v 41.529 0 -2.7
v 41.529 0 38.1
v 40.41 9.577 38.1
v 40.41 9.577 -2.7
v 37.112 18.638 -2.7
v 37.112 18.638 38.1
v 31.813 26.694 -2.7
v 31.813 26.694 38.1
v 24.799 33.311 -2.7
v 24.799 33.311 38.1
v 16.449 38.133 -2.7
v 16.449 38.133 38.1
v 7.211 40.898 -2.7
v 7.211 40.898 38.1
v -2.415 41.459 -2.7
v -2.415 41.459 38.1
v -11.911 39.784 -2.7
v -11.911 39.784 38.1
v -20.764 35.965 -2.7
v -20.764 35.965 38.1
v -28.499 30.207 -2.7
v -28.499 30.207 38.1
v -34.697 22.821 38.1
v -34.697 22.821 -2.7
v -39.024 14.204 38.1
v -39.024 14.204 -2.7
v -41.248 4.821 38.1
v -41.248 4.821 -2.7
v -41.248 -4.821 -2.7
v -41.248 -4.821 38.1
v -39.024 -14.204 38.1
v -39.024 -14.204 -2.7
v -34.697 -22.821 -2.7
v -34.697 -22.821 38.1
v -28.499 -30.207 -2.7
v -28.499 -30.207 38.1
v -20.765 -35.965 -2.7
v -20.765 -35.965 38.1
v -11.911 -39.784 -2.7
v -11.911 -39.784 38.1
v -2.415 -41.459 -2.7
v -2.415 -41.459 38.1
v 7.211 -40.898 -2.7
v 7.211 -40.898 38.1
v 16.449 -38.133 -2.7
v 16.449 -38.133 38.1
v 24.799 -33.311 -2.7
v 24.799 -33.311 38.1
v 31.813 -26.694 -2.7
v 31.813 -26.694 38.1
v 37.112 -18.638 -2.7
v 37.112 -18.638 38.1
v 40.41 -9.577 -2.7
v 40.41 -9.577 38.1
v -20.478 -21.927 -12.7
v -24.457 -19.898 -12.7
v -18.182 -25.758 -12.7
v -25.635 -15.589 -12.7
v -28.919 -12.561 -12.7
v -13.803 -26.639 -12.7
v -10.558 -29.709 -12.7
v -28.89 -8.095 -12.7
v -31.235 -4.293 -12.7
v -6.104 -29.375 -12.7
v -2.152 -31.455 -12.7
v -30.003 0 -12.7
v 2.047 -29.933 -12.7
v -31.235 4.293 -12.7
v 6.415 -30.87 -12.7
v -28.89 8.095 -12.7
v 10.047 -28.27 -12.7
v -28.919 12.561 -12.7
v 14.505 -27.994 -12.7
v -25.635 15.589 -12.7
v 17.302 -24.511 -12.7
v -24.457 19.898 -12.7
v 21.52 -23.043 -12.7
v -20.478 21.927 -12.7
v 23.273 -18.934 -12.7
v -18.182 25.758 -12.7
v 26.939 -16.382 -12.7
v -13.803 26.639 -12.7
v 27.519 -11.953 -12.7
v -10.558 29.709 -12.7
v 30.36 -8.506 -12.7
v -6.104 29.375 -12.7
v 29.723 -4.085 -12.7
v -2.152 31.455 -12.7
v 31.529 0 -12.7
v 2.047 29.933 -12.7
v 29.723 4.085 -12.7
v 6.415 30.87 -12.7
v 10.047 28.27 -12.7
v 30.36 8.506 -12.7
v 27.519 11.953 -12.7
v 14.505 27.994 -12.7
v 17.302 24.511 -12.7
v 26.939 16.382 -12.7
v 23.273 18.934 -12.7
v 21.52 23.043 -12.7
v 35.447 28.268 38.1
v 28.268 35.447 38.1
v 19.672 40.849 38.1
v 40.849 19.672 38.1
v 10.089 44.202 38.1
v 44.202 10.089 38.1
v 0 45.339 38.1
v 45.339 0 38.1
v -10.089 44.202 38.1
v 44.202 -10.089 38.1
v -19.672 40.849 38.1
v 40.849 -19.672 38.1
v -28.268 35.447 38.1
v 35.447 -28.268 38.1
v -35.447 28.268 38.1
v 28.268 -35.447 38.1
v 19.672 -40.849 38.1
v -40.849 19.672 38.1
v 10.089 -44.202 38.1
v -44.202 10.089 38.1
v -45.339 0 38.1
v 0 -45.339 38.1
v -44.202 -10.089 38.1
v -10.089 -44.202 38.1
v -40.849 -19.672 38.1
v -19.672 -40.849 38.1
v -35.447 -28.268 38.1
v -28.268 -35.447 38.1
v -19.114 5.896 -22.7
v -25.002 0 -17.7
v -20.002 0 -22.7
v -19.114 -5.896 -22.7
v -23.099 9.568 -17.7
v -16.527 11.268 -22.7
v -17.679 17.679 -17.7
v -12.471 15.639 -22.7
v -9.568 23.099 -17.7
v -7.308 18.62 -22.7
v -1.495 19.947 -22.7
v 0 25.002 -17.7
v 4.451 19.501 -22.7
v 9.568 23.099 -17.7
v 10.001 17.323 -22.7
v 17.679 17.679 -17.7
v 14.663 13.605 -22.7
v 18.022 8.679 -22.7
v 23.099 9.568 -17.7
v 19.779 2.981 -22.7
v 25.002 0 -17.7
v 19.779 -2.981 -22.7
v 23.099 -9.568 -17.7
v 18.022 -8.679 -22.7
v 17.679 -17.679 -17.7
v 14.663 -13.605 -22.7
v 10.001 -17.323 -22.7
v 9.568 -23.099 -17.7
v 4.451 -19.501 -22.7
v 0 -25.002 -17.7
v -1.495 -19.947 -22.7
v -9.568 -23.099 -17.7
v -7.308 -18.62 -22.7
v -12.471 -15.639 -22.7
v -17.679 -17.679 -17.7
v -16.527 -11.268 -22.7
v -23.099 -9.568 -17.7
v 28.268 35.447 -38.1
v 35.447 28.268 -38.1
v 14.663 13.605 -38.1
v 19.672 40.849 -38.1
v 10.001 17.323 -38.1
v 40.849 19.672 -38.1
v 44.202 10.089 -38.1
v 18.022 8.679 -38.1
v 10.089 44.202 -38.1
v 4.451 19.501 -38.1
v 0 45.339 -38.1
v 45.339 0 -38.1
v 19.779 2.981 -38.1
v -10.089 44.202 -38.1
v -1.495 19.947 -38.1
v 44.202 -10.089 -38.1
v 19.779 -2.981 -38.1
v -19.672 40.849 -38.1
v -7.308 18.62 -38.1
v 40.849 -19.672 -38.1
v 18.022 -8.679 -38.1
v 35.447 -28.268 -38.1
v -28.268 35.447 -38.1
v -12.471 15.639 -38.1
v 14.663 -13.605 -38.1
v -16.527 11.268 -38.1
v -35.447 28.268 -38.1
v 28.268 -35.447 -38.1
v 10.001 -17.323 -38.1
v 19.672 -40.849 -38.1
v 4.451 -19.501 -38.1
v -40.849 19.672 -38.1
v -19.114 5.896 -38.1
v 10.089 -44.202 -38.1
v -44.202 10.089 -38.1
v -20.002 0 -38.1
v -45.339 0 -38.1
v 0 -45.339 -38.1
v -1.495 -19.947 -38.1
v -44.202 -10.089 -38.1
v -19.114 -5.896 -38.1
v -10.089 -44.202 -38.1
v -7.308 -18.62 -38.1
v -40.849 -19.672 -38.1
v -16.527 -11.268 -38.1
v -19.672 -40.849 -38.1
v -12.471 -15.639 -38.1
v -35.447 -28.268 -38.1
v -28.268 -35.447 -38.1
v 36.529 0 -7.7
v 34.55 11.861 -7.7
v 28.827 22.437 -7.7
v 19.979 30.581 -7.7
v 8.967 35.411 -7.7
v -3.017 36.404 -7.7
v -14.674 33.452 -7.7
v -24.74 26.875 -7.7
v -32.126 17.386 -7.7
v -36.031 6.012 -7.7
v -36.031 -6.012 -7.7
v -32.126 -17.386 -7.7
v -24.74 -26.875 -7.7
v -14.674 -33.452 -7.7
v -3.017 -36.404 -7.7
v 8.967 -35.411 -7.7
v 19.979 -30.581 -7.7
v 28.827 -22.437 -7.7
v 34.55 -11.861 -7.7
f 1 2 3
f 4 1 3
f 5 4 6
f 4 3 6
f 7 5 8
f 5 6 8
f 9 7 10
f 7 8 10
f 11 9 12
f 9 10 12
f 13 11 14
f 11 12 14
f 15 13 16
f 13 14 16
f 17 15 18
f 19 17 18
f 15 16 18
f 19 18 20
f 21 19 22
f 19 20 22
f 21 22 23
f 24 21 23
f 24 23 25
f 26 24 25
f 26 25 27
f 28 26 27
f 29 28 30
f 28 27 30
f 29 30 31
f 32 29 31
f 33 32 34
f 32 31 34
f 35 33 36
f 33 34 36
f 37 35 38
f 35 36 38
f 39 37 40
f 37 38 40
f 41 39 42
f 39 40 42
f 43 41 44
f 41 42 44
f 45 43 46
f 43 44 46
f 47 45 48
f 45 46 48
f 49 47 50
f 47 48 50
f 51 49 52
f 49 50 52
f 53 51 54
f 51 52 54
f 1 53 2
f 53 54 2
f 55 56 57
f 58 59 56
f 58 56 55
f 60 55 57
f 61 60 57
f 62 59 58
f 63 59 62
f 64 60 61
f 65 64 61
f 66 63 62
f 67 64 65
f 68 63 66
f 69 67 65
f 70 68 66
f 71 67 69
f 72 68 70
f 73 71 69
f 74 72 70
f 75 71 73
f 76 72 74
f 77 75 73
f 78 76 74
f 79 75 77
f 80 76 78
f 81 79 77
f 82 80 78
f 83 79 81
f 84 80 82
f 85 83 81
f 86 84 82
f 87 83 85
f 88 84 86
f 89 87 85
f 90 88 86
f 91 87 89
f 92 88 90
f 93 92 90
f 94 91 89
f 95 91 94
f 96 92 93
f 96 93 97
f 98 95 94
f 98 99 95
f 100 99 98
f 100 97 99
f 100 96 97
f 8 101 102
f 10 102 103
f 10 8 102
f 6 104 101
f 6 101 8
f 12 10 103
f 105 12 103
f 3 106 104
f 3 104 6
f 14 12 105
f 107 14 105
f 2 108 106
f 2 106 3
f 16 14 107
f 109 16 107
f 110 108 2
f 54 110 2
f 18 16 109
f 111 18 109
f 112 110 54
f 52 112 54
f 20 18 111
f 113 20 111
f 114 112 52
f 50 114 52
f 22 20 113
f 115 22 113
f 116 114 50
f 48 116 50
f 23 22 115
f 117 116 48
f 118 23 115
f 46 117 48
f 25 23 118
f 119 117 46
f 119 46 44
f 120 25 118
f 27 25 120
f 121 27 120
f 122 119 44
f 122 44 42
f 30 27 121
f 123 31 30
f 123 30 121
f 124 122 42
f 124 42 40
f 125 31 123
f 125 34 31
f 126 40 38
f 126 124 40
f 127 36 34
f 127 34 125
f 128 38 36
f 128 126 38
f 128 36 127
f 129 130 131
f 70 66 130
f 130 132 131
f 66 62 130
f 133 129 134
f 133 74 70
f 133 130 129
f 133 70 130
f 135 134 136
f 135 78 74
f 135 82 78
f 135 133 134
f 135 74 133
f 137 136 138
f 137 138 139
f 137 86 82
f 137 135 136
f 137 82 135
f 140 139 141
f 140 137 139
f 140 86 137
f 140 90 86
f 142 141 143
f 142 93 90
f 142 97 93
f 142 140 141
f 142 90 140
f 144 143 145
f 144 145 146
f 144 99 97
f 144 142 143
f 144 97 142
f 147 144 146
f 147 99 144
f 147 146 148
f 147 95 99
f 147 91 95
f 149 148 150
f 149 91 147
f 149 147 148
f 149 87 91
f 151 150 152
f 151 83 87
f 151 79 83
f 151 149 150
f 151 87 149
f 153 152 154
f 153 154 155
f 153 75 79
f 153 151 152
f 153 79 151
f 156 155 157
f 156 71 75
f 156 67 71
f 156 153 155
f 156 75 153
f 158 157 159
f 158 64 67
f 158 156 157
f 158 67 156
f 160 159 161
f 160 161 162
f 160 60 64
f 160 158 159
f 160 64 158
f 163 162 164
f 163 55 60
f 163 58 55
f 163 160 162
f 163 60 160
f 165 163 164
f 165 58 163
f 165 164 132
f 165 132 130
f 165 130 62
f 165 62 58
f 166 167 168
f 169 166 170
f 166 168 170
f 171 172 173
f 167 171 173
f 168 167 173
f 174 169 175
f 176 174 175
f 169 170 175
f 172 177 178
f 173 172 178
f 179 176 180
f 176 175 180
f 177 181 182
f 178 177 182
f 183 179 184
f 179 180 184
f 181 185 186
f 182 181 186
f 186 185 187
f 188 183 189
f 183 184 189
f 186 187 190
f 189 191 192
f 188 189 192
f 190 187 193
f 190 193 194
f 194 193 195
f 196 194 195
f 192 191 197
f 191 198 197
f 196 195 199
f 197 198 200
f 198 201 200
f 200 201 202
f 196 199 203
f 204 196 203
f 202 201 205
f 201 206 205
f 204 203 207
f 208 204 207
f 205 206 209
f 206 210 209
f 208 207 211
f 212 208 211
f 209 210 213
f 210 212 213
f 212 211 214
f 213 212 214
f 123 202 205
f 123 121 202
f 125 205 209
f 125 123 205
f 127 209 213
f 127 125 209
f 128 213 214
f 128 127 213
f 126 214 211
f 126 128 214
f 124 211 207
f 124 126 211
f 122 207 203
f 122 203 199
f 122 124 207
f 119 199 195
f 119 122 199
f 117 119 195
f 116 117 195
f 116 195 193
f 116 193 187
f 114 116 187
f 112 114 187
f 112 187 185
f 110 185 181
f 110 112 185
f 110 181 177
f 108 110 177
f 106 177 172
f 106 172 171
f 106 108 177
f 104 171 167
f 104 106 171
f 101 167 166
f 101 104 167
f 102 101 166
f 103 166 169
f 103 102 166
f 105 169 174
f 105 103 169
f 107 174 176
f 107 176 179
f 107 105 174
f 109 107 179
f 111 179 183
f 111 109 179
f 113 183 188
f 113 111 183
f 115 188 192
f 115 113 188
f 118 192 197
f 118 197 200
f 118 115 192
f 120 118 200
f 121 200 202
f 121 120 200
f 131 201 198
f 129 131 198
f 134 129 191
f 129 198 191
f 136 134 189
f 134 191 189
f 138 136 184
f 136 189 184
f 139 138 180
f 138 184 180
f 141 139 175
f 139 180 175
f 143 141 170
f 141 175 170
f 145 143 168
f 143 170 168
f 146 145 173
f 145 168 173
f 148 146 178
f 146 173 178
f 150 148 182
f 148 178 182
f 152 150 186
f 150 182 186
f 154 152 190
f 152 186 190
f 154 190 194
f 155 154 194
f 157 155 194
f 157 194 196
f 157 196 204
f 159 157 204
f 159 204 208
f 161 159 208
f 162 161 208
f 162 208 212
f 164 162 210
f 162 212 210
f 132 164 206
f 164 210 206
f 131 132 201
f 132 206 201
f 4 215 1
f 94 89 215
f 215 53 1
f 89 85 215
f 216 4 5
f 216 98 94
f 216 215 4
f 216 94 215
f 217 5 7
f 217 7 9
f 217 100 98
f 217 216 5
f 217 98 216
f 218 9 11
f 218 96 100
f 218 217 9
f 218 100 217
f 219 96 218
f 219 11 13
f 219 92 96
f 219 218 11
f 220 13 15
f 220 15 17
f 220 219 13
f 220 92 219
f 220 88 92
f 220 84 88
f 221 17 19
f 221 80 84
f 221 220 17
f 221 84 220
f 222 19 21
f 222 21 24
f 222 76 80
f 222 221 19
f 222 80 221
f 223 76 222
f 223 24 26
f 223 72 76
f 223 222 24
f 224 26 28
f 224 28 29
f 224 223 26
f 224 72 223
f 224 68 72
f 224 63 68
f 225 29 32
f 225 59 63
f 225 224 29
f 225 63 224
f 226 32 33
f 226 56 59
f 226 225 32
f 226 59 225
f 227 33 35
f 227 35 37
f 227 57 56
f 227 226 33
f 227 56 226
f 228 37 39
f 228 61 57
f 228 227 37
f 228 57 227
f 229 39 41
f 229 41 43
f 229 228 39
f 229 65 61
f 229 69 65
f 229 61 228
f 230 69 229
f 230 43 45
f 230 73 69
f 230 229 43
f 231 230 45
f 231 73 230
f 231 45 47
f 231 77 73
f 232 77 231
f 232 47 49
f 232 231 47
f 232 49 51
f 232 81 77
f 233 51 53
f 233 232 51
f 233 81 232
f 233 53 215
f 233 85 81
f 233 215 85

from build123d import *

# Parameters (mm, degrees)
SKETCH1_R           = 45.339
BOSS_EXTRUDE2_DEPTH = 38.1
SKETCH3_R           = 41.529
CUT_EXTRUDE1_DEPTH  = 50.8
SKETCH4_R           = 20.0025
CUT_EXTRUDE2_DEPTH  = 25.4
CHAMFER1_SIZE       = 10


with BuildPart() as part:
    # Sketch1 → Boss-Extrude2 (new, symmetric)
    with BuildSketch(Plane(origin=(0, 0, 0), x_dir=(0, 1, 0), z_dir=(0, 0, 1))):
        with Locations(Location((0, 0, 0), (0, 0, 90))):
            Circle(SKETCH1_R)
    extrude(amount=BOSS_EXTRUDE2_DEPTH, both=True)

    # Sketch3 → Cut-Extrude1 (cut)
    with BuildSketch(Plane.XY.offset(38.1)):
        Circle(SKETCH3_R)
    extrude(amount=-CUT_EXTRUDE1_DEPTH, mode=Mode.SUBTRACT)

    # Sketch4 → Cut-Extrude2 (cut)
    with BuildSketch(Plane(origin=(0, 0, -38.1), x_dir=(1, 0, 0), z_dir=(0, 0, -1))):
        with Locations(Location((0, 0, 0), (0, 0, 180))):
            Circle(SKETCH4_R)
    extrude(amount=-CUT_EXTRUDE2_DEPTH, mode=Mode.SUBTRACT)

    # Chamfer1
    chamfer1_edges = [part.edges().sort_by_distance(p)[0] for p in [
        (20.0025, 0, -12.7),
        (-41.529, 0, -12.7),
    ]]
    chamfer(chamfer1_edges, length=CHAMFER1_SIZE)


solid = part.part
